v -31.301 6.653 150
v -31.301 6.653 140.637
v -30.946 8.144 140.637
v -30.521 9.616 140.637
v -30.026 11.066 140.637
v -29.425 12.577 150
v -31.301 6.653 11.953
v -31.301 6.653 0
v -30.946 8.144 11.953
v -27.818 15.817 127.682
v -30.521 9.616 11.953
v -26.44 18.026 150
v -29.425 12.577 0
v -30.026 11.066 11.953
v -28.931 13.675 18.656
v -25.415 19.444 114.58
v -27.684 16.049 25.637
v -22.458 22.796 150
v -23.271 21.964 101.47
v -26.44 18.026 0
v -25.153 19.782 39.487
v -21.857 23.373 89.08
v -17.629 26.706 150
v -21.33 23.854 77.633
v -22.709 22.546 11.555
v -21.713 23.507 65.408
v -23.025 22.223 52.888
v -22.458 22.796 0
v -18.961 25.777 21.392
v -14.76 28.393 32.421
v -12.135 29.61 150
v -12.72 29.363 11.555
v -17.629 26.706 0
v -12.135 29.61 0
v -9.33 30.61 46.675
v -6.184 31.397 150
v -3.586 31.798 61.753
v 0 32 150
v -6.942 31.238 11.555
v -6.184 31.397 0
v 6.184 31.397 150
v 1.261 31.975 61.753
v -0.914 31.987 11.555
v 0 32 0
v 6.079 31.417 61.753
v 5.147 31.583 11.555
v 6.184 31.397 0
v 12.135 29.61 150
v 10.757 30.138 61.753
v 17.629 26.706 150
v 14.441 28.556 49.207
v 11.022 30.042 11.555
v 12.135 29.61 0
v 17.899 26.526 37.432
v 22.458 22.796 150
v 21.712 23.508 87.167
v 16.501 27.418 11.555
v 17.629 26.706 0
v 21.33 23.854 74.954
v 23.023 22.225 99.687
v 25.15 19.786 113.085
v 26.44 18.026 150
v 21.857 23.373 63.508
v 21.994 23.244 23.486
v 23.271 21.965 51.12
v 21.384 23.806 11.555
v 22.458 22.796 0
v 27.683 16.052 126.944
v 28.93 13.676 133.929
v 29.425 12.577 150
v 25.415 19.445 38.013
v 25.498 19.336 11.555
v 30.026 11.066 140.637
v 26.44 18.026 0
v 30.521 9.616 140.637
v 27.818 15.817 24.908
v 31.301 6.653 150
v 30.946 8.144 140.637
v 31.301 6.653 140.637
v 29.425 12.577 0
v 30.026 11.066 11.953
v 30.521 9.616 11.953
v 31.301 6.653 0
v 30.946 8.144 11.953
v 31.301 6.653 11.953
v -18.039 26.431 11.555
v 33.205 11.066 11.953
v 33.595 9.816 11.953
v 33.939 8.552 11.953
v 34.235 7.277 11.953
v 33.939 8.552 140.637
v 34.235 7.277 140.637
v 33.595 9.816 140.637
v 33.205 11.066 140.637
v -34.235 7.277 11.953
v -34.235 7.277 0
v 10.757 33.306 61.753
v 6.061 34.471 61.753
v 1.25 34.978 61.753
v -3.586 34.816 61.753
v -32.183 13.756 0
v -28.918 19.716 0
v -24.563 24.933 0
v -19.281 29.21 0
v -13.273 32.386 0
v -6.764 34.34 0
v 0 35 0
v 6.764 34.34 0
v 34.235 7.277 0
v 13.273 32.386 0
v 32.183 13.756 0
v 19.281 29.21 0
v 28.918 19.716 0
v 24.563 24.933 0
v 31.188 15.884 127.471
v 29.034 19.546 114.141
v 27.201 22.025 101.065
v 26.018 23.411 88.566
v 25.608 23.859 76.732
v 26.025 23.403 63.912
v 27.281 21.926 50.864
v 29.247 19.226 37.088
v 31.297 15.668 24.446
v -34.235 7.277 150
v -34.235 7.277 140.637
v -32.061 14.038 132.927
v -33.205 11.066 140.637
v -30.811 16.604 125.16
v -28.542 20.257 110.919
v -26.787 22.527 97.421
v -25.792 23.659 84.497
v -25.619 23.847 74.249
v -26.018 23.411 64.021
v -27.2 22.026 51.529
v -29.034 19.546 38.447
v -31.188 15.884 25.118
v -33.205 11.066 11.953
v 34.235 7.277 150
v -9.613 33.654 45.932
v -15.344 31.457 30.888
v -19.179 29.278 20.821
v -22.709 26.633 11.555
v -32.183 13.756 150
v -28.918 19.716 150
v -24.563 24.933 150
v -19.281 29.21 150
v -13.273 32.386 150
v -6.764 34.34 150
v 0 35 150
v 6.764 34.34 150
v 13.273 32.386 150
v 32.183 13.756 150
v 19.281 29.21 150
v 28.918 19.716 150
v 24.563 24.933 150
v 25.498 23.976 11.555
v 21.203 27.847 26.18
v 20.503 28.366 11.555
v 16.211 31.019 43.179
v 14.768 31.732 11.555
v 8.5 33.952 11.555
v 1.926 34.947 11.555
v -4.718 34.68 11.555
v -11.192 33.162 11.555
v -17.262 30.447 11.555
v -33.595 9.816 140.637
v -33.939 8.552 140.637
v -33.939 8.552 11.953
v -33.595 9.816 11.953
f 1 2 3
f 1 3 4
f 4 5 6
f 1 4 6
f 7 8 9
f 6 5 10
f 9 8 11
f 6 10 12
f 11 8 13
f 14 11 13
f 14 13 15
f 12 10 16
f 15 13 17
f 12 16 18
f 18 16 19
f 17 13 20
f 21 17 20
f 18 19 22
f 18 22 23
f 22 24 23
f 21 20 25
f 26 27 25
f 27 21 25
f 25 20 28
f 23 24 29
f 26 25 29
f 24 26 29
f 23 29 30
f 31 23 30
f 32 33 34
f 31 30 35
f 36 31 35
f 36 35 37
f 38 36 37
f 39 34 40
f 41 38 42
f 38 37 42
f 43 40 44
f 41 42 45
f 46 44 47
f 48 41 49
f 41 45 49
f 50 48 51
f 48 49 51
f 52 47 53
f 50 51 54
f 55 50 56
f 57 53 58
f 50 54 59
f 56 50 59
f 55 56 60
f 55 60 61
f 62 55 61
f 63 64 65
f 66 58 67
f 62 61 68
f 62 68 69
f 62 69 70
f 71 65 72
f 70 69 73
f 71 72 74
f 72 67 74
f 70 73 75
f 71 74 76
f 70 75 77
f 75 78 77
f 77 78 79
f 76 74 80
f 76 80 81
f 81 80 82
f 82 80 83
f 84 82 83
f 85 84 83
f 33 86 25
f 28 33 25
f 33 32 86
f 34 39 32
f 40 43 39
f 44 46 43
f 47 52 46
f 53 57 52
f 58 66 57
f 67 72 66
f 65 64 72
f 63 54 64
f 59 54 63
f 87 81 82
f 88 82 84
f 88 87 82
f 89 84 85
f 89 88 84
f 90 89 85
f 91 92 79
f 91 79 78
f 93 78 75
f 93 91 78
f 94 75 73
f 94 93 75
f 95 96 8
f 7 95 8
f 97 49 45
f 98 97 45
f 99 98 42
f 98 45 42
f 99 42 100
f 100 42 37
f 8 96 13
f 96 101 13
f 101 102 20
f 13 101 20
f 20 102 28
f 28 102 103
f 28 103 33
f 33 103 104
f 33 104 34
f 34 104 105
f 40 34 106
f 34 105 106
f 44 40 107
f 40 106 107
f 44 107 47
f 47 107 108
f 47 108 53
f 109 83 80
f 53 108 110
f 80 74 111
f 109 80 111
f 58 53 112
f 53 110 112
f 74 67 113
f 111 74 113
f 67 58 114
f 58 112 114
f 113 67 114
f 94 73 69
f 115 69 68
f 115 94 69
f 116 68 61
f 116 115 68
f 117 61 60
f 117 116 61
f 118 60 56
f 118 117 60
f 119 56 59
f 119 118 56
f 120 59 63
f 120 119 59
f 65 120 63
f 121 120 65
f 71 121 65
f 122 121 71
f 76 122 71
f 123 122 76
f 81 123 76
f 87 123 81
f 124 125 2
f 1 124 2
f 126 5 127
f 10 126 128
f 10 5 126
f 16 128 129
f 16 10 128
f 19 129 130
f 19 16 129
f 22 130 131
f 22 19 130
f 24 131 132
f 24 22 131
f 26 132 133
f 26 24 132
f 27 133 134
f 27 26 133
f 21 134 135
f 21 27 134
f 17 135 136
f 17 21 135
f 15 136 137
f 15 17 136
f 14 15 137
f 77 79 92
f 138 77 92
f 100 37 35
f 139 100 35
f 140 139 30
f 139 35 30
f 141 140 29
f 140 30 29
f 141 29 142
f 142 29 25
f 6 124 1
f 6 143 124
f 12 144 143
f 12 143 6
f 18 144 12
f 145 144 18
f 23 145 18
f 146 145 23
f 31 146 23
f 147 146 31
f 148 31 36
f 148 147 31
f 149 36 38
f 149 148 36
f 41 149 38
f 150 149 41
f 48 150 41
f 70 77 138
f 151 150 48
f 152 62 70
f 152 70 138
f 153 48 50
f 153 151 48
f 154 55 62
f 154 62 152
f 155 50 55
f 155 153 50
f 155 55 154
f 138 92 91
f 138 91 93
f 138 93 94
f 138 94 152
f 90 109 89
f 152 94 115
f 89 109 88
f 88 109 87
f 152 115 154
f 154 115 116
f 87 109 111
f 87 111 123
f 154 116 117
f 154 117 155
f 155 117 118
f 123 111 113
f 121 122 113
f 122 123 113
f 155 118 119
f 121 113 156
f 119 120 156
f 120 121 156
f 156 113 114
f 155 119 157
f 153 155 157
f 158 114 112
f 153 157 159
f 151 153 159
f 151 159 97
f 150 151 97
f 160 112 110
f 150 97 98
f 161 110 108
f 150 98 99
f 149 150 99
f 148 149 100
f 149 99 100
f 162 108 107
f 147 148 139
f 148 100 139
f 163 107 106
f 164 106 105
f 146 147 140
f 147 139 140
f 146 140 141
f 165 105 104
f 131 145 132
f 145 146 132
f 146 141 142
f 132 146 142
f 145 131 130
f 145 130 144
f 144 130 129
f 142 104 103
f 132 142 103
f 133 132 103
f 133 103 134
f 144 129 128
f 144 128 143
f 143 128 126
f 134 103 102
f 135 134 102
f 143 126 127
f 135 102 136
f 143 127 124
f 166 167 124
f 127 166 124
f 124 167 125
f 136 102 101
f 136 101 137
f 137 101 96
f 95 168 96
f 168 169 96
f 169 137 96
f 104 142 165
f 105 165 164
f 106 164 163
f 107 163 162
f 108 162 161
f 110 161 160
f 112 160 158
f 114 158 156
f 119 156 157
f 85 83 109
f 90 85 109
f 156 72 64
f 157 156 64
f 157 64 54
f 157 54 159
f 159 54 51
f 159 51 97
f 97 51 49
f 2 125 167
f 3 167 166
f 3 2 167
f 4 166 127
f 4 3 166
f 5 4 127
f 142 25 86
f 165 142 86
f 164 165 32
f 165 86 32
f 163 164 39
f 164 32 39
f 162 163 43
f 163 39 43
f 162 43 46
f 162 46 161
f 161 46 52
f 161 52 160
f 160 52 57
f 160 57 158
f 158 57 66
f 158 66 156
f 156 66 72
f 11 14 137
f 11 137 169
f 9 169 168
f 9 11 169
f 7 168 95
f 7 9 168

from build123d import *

# Parameters (mm, degrees)
SALIENTE_EXTRUIR1_DEPTH = 150
CORTAR_EXTRUIR1_DEPTH   = 158.787979874
CORTAR_EXTRUIR2_DEPTH   = 75


with BuildPart() as part:
    # Croquis1 → Saliente-Extruir1 (new body)
    with BuildSketch(Plane.XY):
        with BuildLine():
            Line((-34.235166026, 7.276909179), (-31.300723223, 6.653174106))
            ThreePointArc((-31.300723223, 6.653174106), (0, 32), (31.300723223, 6.653174106))
            Line((31.300723223, 6.653174106), (34.235166026, 7.276909179))
            ThreePointArc((34.235166026, 7.276909179), (0, 35), (-34.235166026, 7.276909179))
        make_face()
    extrude(amount=SALIENTE_EXTRUIR1_DEPTH)

    # Croquis2 → Cortar-Extruir1 (cut, through all)
    with BuildSketch(Plane(origin=(0, 0, 0), x_dir=(1, 0, 0), z_dir=(0, 1, 0))):
        Polygon((-22.708838208, -11.554693253), (25.4976429, -11.554693253), (10.756818098, -61.753177712), (-3.585606033, -61.753177712), align=None)
    extrude(amount=CORTAR_EXTRUIR1_DEPTH, mode=Mode.SUBTRACT)

    # Croquis3 → Cortar-Extruir2 (cut, symmetric)
    with BuildSketch(Plane(origin=(0, 0, 0), x_dir=(0, 0, -1), z_dir=(1, 0, 0))):
        with BuildLine():
            Line((-11.953093924, 11.065770631), (-11.953093924, 0))
            Line((-11.953093924, 0), (-140.636510433, 0))
            Line((-140.636510433, 0), (-140.636510433, 11.065770631))
            ThreePointArc((-140.636510433, 11.065770631), (-76.294802179, 23.859279702), (-11.953093924, 11.065770631))
        make_face()
    extrude(amount=CORTAR_EXTRUIR2_DEPTH, both=True, mode=Mode.SUBTRACT)


solid = part.part
